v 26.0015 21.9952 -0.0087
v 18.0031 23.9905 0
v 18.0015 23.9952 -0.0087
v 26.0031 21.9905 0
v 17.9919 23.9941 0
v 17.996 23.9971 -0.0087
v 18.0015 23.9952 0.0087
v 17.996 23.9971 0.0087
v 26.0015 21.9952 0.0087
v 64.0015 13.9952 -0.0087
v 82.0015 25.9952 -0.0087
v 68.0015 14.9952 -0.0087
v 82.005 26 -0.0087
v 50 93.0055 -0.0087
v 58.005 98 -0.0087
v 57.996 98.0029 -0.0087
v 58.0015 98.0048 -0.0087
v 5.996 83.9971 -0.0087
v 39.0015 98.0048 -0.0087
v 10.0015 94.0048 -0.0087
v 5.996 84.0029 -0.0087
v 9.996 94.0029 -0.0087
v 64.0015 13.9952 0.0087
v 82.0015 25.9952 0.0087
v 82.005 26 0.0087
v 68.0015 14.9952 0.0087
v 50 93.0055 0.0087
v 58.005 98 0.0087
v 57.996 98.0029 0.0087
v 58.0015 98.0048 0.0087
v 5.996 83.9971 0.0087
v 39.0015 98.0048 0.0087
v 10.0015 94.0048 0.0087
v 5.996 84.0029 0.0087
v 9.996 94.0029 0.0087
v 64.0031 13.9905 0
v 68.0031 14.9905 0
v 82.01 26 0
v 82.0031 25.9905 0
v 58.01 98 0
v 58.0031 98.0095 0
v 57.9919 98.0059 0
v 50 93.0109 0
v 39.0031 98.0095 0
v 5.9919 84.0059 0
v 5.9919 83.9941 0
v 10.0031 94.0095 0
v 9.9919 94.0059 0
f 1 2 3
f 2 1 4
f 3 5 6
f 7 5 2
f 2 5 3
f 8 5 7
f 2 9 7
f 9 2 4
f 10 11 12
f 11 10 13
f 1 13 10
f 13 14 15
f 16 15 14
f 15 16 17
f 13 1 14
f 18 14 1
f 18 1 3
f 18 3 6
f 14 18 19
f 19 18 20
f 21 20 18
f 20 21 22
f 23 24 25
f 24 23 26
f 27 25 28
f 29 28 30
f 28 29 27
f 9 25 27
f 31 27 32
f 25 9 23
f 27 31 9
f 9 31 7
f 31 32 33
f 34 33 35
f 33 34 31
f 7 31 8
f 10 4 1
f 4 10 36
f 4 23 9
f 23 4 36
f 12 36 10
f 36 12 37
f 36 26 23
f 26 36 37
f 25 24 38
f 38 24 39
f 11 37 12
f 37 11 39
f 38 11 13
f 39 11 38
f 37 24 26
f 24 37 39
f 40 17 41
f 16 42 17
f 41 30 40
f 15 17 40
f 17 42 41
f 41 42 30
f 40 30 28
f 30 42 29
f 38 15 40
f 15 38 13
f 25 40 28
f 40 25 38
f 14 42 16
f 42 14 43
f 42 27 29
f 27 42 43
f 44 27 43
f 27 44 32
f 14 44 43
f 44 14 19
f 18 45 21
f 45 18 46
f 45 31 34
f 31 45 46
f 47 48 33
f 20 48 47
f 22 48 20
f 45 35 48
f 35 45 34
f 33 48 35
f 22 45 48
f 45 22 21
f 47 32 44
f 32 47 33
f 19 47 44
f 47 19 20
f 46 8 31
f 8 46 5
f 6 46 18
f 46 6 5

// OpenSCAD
color([0.3519350680925015,0.6477014615427978,0.14125726454845833]) hull(){
    translate([26,22]) sphere(0.01);
    translate([18,24]) sphere(0.01);
    translate([42,29]) sphere(0.01);
}
color([0.23013900541024712,0.8285218163248013,0.9603761550286747]) hull(){
    translate([18,24]) sphere(0.01);
    translate([18,58]) sphere(0.01);
    translate([42,29]) sphere(0.01);
}
color([0.6050710034948523,0.017553655236826726,0.43262871278032167]) hull(){
    translate([18,58]) sphere(0.01);
    translate([42,29]) sphere(0.01);
    translate([44,47]) sphere(0.01);
}
color([0.2571490251669072,0.4480229944680496,0.14517873337393172]) hull(){
    translate([42,29]) sphere(0.01);
    translate([44,47]) sphere(0.01);
    translate([58,33]) sphere(0.01);
}
color([0.8405131005933094,0.9776834869331054,0.10300019528175153]) hull(){
    translate([26,22]) sphere(0.01);
    translate([42,29]) sphere(0.01);
    translate([64,14]) sphere(0.01);
}
color([0.998153073210626,0.8535026464000083,0.6855970549077809]) hull(){
    translate([42,29]) sphere(0.01);
    translate([58,33]) sphere(0.01);
    translate([64,14]) sphere(0.01);
}
color([0.7995005100691247,0.34047238184459006,0.1286635278612125]) hull(){
    translate([58,33]) sphere(0.01);
    translate([64,14]) sphere(0.01);
    translate([68,15]) sphere(0.01);
}
color([0.6020598448119898,0.9167847797194366,0.02081986636819022]) hull(){
    translate([58,33]) sphere(0.01);
    translate([68,15]) sphere(0.01);
    translate([82,26]) sphere(0.01);
}
color([0.9135118305629362,0.3823609034395232,0.42581309278619206]) hull(){
    translate([44,55]) sphere(0.01);
    translate([58,33]) sphere(0.01);
    translate([82,26]) sphere(0.01);
}
color([0.08967296065919184,0.0016857337534631478,0.31287848776698257]) hull(){
    translate([18,58]) sphere(0.01);
    translate([44,55]) sphere(0.01);
    translate([44,47]) sphere(0.01);
}
color([0.09731792302828757,0.364404074066101,0.8754307508322564]) hull(){
    translate([44,55]) sphere(0.01);
    translate([44,47]) sphere(0.01);
    translate([58,33]) sphere(0.01);
}
color([0.6967090939923642,0.5776053806129825,0.18685318159950626]) hull(){
    translate([18,58]) sphere(0.01);
    translate([44,55]) sphere(0.01);
    translate([58,98]) sphere(0.01);
}
color([0.9585806736472646,0.593334846568766,0.09927504601217696]) hull(){
    translate([44,55]) sphere(0.01);
    translate([82,26]) sphere(0.01);
    translate([58,98]) sphere(0.01);
}
color([0.19313665173925,0.6863688301261038,0.2093263356404984]) hull(){
    translate([58,98]) sphere(0.01);
    translate([50,93]) sphere(0.01);
    translate([82,26]) sphere(0.01);
}
color([0.2694340379225941,0.24598969558588324,0.16092298384524362]) hull(){
    translate([50,93]) sphere(0.01);
    translate([82,26]) sphere(0.01);
    translate([44,55]) sphere(0.01);
}
color([0.5102606956149307,0.431705445139412,0.38909399282504675]) hull(){
    translate([18,58]) sphere(0.01);
    translate([58,98]) sphere(0.01);
    translate([50,93]) sphere(0.01);
}
color([0.3194819673674283,0.6655357355223767,0.22692357675811492]) hull(){
    translate([18,58]) sphere(0.01);
    translate([50,93]) sphere(0.01);
    translate([22,90]) sphere(0.01);
}
color([0.9464906820257937,0.35776616524050997,0.9421064453260054]) hull(){
    translate([22,90]) sphere(0.01);
    translate([50,93]) sphere(0.01);
    translate([39,98]) sphere(0.01);
}
color([0.3792404853118415,0.27508202782836655,0.9368074710650367]) hull(){
    translate([18,58]) sphere(0.01);
    translate([22,90]) sphere(0.01);
    translate([6,84]) sphere(0.01);
}
color([0.7670397757471089,0.17483880300164423,0.7474114244696689]) hull(){
    translate([6,84]) sphere(0.01);
    translate([22,90]) sphere(0.01);
    translate([10,94]) sphere(0.01);
}
color([0.6015236368594579,0.5872808850844162,0.28390336255679416]) hull(){
    translate([22,90]) sphere(0.01);
    translate([10,94]) sphere(0.01);
    translate([39,98]) sphere(0.01);
}
color([0.5839405385485582,0.4048698908705002,0.6877557316706271]) hull(){
    translate([18,58]) sphere(0.01);
    translate([6,84]) sphere(0.01);
    translate([18,24]) sphere(0.01);
}
